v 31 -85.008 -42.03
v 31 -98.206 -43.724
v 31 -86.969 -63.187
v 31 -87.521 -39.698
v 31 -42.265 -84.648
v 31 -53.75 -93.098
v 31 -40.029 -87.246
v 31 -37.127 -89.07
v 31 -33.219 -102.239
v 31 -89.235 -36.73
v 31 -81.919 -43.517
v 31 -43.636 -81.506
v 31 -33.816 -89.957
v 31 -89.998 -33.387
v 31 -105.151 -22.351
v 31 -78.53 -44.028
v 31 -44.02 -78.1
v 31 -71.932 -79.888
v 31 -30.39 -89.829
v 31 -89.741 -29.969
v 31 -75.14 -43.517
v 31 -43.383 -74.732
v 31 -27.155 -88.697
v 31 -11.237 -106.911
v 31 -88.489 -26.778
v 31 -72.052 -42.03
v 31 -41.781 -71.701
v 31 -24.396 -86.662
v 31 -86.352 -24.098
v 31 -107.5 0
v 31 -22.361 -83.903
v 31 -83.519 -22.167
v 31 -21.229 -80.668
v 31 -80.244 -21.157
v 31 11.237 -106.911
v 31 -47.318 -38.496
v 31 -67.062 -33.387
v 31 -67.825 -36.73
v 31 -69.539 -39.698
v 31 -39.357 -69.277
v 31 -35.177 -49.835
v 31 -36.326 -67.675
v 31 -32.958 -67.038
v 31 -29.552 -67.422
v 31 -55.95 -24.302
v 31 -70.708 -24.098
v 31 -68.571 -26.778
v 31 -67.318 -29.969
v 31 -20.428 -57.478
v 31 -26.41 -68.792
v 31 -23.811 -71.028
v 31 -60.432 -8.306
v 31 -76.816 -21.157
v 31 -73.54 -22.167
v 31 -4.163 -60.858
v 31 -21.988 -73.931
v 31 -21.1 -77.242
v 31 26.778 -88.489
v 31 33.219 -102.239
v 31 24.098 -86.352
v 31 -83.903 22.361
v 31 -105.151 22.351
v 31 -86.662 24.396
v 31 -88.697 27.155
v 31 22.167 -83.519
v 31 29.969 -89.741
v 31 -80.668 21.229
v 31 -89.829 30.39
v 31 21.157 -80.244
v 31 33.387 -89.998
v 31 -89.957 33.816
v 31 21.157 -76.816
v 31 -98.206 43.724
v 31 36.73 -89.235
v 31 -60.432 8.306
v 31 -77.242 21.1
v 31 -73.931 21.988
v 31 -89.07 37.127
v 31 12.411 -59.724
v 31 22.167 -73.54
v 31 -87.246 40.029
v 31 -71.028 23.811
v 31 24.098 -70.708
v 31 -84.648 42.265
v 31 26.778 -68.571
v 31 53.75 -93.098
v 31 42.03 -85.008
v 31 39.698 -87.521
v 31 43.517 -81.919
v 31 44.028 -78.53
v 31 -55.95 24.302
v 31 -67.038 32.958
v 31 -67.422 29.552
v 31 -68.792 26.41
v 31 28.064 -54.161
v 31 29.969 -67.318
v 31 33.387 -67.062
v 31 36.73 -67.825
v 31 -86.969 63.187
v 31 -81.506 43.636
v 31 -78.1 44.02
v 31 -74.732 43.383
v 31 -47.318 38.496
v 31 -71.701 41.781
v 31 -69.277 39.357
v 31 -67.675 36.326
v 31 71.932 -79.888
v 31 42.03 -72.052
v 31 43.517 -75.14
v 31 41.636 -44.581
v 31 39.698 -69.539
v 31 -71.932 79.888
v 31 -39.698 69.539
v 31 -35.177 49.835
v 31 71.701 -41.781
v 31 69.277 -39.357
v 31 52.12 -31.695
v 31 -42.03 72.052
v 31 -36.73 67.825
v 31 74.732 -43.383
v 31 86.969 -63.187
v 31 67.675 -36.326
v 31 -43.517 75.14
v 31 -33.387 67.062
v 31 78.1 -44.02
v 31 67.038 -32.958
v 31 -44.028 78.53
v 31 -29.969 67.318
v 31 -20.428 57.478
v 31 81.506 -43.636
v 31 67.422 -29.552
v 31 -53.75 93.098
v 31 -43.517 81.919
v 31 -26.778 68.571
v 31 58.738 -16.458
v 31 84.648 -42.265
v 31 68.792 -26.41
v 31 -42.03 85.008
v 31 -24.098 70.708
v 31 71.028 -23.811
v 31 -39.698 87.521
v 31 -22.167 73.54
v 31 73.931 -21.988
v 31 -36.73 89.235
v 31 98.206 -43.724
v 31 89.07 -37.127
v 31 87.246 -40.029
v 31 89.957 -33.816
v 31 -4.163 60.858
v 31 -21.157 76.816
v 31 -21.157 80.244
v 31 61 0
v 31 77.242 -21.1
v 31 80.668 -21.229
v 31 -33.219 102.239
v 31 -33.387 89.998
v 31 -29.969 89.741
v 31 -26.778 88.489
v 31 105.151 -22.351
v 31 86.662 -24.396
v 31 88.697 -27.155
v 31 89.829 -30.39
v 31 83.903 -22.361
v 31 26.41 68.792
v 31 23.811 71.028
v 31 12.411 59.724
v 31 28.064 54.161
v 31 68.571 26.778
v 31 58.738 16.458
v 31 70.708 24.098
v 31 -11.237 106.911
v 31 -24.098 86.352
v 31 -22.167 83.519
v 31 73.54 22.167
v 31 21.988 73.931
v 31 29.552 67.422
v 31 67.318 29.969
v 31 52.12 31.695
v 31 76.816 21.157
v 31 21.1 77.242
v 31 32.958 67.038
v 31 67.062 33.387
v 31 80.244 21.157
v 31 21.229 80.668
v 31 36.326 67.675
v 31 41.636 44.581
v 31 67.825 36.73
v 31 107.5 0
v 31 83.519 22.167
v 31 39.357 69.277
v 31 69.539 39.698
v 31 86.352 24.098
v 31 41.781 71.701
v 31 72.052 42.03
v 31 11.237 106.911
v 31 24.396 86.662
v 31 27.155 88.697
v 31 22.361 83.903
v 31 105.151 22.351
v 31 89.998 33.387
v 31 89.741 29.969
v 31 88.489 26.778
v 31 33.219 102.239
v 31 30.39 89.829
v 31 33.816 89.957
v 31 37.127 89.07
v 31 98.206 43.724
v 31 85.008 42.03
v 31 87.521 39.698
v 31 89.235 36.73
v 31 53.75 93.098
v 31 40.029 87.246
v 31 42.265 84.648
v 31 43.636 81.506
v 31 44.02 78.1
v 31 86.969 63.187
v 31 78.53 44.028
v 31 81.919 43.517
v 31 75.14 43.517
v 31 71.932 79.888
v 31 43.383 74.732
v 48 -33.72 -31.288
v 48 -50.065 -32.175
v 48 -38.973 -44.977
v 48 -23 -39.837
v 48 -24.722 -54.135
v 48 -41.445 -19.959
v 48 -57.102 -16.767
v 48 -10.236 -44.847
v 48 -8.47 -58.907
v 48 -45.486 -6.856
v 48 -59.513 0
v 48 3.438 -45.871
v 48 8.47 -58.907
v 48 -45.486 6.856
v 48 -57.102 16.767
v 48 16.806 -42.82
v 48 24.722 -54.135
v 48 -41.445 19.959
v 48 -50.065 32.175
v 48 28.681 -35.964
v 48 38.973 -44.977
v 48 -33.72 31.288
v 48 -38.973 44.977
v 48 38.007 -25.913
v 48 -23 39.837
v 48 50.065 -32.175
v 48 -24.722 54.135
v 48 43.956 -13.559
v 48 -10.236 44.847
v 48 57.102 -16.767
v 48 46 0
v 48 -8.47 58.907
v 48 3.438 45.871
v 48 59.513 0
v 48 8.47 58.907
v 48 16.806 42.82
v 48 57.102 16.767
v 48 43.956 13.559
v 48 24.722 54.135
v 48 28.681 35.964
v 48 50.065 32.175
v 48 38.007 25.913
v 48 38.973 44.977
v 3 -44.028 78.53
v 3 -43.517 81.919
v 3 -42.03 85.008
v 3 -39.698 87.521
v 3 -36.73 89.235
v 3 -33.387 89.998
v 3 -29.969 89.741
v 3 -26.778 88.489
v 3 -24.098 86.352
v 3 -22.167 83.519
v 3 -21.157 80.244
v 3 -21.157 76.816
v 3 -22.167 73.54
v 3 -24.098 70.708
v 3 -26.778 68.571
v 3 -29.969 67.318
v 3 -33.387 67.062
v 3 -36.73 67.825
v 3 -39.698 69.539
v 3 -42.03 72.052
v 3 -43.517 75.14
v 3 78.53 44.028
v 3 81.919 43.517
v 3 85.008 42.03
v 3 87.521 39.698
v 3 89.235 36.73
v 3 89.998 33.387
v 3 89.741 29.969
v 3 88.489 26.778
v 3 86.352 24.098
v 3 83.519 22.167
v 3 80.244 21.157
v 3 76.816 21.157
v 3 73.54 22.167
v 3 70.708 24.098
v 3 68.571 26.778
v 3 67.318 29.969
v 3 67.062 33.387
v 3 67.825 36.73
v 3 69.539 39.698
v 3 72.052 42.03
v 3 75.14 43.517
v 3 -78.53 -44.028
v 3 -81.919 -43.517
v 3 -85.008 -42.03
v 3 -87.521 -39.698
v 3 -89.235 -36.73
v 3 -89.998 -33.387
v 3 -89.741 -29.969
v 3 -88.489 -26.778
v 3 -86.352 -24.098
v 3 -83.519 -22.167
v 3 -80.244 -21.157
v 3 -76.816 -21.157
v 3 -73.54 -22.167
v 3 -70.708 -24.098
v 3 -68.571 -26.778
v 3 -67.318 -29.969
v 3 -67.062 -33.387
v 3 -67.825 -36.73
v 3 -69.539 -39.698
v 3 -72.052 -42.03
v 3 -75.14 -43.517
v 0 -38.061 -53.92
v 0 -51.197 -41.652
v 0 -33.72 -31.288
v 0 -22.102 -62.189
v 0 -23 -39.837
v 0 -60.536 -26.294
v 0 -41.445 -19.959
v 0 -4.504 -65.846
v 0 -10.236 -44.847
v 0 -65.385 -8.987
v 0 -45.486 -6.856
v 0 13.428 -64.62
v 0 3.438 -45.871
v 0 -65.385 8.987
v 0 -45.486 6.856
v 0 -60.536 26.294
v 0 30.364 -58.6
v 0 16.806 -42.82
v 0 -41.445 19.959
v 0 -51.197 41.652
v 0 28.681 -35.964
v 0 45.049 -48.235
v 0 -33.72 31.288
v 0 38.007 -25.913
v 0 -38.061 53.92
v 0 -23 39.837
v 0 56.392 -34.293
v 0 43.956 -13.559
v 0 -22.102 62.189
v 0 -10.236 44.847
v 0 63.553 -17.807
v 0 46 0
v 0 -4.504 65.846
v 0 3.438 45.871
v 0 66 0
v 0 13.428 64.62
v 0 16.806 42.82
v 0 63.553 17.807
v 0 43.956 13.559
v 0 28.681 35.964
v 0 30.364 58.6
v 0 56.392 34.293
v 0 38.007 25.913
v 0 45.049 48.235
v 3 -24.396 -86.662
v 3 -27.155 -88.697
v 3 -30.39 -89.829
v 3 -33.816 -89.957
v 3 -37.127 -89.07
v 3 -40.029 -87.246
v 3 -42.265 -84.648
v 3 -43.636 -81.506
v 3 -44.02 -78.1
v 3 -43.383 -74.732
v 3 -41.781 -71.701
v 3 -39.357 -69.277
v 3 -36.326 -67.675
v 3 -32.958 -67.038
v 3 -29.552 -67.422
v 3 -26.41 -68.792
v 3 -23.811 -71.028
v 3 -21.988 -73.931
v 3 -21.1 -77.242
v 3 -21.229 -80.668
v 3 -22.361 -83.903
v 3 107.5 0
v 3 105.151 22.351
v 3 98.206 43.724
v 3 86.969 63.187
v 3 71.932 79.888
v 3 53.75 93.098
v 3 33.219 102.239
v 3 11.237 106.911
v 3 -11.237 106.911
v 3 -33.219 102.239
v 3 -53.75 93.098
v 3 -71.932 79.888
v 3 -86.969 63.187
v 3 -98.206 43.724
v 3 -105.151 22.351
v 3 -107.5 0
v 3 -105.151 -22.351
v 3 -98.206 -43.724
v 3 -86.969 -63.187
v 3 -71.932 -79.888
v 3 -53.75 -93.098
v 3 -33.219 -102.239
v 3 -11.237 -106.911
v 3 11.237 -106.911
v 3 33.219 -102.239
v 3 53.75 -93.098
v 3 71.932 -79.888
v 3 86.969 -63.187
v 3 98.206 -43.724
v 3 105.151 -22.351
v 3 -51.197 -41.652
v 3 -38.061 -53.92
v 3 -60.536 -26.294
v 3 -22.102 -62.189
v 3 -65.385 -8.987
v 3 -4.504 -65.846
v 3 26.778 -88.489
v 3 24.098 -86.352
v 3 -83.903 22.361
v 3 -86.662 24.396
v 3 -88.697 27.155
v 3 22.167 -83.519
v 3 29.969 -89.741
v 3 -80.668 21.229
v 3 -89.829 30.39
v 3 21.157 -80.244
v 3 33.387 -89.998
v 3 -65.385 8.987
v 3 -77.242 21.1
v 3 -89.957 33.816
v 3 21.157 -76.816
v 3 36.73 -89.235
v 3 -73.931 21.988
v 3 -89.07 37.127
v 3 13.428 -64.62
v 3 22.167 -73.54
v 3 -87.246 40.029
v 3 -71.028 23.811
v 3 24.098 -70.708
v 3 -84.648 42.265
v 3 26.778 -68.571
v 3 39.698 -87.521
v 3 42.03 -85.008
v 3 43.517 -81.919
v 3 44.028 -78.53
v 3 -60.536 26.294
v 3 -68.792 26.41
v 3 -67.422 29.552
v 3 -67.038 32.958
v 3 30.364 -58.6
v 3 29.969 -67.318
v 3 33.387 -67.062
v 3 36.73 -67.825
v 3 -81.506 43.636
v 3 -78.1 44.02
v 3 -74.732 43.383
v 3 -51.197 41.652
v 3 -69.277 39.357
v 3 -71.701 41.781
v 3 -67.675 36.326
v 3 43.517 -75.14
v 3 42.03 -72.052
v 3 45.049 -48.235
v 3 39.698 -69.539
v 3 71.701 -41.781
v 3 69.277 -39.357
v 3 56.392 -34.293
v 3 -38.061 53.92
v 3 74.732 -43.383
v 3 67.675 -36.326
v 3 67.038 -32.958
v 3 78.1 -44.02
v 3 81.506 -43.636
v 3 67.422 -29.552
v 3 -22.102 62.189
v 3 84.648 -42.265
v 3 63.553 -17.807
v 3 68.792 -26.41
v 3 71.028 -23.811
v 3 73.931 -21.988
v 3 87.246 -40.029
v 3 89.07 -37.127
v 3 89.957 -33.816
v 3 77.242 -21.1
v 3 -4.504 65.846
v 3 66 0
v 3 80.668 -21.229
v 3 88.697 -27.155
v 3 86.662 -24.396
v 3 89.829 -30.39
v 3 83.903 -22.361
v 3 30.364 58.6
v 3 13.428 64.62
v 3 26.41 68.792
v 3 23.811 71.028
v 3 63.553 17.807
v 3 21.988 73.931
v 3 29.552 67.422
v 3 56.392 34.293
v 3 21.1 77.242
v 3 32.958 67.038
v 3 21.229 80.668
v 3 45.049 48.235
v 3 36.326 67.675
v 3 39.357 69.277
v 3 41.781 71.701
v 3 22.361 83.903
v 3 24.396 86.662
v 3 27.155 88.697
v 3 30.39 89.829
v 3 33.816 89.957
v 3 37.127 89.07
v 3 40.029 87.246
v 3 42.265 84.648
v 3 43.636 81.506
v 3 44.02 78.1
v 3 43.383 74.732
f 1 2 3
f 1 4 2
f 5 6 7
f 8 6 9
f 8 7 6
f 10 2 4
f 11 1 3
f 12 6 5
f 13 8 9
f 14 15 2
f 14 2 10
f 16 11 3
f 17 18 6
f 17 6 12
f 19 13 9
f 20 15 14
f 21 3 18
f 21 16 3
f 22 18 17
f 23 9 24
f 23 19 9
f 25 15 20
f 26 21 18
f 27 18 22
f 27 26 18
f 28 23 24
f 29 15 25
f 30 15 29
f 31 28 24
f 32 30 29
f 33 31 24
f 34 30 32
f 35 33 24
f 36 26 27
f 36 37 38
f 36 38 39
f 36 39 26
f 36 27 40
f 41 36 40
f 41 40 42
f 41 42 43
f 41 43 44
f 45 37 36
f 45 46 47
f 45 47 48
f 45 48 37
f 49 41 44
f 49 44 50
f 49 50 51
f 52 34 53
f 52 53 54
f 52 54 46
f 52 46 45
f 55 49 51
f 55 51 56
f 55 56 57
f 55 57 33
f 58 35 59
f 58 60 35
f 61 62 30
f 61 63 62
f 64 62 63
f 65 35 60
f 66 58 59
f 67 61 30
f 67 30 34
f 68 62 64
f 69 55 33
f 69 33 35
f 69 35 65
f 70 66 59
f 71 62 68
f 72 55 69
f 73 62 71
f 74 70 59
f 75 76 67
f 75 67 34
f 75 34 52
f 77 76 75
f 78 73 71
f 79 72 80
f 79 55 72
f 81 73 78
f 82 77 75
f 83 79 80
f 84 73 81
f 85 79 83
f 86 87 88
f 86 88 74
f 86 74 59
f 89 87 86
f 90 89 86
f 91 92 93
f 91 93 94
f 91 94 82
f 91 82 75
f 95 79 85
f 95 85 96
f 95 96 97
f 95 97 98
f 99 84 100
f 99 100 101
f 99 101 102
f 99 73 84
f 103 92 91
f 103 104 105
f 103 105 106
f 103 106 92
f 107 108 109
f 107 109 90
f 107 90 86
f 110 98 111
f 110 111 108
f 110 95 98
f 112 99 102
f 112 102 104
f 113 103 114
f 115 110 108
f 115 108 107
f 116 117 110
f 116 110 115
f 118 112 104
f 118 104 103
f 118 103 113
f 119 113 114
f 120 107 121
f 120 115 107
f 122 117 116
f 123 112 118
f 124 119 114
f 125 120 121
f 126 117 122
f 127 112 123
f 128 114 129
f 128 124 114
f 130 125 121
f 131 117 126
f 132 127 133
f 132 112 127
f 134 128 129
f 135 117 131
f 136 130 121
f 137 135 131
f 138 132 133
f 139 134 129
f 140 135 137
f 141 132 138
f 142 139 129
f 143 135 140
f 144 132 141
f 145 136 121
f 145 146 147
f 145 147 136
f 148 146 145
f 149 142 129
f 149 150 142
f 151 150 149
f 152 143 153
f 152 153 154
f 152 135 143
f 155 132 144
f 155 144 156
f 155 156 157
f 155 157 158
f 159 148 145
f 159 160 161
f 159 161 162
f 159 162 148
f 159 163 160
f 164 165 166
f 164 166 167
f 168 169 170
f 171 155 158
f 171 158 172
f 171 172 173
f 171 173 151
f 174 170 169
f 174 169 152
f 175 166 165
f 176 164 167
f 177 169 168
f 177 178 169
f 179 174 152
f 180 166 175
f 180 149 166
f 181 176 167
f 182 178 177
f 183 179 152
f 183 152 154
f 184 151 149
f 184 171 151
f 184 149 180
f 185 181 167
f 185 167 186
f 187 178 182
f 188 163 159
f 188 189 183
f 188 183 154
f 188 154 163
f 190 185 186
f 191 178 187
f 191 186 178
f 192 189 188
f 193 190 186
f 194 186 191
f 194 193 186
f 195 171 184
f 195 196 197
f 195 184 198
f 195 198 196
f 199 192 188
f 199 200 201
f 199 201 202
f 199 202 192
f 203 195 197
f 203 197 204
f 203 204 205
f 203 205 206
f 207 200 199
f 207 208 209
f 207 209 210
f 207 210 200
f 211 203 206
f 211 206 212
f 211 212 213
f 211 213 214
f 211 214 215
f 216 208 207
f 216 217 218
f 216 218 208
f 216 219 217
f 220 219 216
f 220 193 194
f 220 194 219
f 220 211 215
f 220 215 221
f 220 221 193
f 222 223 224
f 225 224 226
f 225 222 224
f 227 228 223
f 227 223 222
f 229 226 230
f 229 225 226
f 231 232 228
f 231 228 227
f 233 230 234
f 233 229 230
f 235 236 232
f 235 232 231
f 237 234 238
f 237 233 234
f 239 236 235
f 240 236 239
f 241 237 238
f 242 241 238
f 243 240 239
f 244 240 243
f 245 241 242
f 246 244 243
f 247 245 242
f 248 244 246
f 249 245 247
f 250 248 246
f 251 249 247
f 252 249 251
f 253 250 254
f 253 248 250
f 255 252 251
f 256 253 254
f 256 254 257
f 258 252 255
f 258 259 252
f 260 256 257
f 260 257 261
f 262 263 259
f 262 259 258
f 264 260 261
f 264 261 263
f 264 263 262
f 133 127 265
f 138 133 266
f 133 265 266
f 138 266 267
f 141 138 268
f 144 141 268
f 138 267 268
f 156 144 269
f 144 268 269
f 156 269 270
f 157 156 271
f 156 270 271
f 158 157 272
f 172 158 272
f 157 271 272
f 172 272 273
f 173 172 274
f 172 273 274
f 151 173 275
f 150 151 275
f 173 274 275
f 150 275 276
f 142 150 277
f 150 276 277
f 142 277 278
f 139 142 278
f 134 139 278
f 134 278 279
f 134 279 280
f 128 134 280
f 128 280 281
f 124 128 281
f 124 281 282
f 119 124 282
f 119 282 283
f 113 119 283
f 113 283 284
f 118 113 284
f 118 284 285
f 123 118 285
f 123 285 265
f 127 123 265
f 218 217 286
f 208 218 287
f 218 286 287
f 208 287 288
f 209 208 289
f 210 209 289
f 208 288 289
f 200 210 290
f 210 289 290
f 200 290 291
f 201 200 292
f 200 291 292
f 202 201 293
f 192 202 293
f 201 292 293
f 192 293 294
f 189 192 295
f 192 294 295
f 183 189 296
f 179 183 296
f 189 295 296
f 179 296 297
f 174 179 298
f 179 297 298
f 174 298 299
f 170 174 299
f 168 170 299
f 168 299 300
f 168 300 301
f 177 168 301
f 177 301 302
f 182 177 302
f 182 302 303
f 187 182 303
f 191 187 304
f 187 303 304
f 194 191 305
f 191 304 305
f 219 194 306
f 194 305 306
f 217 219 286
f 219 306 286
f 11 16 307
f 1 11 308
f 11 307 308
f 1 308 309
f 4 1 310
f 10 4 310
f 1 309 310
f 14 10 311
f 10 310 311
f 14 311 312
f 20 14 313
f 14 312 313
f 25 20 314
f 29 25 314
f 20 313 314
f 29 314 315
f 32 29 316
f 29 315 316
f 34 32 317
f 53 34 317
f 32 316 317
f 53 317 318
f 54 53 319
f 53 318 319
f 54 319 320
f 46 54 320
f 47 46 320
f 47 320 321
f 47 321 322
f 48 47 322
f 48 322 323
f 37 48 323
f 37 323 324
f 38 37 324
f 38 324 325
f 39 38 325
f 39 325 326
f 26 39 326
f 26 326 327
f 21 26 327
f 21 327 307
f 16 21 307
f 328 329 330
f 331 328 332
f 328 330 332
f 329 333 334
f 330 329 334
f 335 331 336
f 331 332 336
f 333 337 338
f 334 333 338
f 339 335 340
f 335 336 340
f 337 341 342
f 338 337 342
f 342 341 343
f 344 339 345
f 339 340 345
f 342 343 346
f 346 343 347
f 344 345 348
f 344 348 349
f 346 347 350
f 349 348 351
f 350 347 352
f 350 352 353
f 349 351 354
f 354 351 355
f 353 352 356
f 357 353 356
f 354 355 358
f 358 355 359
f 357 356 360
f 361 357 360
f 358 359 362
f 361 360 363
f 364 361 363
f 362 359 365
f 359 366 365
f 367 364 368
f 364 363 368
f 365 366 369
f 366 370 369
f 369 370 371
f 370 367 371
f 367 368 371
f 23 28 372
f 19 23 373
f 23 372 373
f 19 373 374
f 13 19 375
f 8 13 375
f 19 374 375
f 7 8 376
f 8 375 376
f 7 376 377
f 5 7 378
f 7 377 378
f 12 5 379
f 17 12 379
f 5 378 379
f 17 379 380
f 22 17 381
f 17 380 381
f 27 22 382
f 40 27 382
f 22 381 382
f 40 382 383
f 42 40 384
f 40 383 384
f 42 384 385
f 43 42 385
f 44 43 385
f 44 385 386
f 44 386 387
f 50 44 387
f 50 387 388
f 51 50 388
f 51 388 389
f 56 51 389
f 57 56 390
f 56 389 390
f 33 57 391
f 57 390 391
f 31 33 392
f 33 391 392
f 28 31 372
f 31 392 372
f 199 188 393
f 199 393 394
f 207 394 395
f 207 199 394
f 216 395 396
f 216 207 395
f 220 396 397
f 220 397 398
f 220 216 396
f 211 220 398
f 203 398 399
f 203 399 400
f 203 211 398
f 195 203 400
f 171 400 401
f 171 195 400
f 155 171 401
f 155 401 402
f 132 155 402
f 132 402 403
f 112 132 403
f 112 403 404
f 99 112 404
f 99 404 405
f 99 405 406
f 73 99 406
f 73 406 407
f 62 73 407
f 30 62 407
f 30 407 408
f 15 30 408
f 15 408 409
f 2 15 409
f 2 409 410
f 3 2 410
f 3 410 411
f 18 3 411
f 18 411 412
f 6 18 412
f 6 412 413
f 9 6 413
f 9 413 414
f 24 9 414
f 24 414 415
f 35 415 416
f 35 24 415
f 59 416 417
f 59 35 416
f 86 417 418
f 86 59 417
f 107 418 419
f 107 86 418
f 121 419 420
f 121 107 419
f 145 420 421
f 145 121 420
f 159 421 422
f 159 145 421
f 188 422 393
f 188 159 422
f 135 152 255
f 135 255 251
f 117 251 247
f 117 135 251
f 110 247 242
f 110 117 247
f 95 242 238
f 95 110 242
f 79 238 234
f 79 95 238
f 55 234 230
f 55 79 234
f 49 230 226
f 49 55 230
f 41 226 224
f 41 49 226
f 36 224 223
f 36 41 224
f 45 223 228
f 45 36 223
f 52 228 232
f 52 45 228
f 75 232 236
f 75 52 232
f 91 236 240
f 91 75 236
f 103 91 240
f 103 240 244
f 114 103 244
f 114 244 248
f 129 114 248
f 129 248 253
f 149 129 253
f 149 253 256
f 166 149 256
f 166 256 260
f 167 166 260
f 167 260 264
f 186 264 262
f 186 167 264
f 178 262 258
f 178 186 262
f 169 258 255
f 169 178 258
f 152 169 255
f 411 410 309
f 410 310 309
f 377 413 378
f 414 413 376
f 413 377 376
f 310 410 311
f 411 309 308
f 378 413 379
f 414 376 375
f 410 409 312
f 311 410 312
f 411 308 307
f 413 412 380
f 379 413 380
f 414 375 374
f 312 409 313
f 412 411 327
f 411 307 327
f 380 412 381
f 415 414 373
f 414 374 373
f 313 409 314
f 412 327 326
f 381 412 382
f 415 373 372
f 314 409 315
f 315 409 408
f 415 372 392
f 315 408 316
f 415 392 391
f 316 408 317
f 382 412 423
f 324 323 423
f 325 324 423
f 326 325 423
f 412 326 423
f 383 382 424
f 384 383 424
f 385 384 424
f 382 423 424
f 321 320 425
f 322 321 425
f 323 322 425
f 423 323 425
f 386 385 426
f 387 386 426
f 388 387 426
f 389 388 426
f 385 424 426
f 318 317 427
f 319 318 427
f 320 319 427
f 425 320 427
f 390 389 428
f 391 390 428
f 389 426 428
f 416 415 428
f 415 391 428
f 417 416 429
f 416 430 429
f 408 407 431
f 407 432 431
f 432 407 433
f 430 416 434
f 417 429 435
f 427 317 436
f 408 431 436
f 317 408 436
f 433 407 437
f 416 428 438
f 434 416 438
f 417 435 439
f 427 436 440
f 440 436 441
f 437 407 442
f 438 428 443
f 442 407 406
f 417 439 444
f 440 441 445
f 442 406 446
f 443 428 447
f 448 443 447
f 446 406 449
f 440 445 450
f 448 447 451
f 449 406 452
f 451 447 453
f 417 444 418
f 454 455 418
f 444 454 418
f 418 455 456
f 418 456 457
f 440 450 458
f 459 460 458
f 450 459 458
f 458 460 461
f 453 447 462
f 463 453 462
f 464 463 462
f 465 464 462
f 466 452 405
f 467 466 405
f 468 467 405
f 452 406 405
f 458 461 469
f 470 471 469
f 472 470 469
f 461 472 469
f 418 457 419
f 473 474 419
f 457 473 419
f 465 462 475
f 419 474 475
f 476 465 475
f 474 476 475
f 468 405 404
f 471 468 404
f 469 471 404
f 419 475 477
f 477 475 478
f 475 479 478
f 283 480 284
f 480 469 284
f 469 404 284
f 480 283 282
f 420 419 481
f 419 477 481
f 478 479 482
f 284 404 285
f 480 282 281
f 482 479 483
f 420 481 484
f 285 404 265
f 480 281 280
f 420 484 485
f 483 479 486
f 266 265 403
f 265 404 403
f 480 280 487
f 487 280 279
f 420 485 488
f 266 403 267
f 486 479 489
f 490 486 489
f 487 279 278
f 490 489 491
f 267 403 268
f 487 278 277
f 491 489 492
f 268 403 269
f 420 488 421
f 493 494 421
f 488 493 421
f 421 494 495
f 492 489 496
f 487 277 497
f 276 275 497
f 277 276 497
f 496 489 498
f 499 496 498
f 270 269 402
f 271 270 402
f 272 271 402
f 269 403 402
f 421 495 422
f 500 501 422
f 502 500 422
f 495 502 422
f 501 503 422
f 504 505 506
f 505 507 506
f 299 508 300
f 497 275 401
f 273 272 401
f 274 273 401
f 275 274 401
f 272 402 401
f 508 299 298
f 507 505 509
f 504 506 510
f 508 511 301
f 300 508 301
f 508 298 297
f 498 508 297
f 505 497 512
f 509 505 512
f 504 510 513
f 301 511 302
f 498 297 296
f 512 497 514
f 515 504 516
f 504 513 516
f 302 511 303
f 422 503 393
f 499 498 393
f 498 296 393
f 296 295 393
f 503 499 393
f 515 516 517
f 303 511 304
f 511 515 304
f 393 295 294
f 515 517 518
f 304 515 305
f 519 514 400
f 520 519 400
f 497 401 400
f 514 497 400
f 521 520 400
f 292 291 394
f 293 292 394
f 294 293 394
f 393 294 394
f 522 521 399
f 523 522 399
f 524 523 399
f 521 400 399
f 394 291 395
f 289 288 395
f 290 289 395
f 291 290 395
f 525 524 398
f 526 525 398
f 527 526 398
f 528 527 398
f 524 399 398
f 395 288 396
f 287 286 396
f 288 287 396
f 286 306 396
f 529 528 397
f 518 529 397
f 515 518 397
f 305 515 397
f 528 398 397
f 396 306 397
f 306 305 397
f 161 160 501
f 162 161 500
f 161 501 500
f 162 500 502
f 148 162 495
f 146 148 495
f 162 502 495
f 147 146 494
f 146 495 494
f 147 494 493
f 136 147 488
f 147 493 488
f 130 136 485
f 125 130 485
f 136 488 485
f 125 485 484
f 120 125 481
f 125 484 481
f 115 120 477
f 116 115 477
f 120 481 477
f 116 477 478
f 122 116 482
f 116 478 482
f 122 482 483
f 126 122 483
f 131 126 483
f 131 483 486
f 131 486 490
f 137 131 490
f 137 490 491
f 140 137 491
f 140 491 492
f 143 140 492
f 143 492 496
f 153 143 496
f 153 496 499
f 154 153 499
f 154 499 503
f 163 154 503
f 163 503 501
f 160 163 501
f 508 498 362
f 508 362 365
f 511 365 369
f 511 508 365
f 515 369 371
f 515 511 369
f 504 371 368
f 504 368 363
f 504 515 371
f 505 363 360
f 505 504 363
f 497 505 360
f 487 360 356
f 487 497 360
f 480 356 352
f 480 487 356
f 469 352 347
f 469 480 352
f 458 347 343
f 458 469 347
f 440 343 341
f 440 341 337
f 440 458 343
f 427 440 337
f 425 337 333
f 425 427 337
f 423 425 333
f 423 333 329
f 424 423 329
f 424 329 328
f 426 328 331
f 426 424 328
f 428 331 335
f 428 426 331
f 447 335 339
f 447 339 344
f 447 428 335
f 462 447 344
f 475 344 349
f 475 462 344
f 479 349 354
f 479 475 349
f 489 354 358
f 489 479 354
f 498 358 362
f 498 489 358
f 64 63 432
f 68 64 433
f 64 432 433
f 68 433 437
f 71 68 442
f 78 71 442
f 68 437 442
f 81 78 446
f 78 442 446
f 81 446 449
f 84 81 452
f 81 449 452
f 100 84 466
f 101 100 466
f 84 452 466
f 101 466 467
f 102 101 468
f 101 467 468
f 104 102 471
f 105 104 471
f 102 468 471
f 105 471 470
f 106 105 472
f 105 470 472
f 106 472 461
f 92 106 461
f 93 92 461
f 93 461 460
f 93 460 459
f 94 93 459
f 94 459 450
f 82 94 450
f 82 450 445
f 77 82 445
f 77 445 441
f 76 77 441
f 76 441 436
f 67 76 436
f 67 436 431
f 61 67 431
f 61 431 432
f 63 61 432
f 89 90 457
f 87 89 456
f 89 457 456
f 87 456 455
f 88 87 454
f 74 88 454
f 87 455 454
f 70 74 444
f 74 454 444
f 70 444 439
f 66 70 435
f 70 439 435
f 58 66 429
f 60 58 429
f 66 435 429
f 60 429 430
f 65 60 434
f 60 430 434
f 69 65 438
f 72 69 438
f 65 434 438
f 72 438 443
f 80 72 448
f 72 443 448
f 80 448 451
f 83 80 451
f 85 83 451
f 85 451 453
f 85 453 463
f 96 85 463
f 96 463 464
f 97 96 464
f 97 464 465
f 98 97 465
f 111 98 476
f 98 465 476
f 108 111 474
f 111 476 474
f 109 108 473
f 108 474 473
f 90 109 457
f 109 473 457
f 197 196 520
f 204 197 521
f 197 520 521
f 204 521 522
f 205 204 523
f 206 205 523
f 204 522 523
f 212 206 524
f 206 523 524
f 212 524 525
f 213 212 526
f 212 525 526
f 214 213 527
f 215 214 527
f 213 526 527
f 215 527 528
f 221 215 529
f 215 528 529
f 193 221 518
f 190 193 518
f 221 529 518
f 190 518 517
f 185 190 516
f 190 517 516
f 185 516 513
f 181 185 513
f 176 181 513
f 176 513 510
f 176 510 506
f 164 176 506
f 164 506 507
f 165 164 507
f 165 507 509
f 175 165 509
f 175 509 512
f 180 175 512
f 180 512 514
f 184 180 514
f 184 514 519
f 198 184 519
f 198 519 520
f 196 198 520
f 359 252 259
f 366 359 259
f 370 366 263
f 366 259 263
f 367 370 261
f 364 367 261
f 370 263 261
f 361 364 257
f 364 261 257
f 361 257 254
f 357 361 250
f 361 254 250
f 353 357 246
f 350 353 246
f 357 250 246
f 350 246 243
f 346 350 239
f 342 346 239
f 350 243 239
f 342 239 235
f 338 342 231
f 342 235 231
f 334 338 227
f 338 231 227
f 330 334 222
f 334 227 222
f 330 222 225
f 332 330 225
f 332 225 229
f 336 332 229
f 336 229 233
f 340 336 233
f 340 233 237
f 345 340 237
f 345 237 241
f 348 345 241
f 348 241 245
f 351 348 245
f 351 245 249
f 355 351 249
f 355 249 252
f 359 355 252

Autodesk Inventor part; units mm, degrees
ref_plane "YZ Plane" through (0, 0, 0) normal (1, 0, 0) x (0, 1, 0)
ref_plane "XZ Plane" through (0, 0, 0) normal (0, 1, 0) x (-1, 0, 0)
ref_plane "XY Plane" through (0, 0, 0) normal (0, 0, 1) x (1, 0, 0)
sketch "Sketch1" plane through (0, 0, 0) normal (0, 0, 1) x (1, 0, 0)
  line L0 (0, 0) -> (48, 0) construction
  line L1 (0, 46) -> (0, 66)
  line L2 (0, 66) -> (3, 66)
  line L3 (3, 107.5) -> (31, 107.5)
  line L4 (0, 46) -> (0, 0) construction
  line L5 (3, 107.5) -> (3, 66)
  line L6 (31, 107.5) -> (31, 61)
  line L7 (0, 46) -> (48, 46)
  line L8 (48, 46) -> (48, 0) construction
  line L9 (48, 59.5127) -> (31, 61)
  line L10 (48, 59.5127) -> (48, 46)
  dimension "d0" = 132
  dimension "d1" = 215
  dimension "d2" = 31
  dimension "d3" = 3
  dimension "d8" = 92
  dimension "d9" = 122
  dimension "d10" = 48
  dimension "d12" = 5
revolve "Revolution1" add sketch "Sketch1" angle 360 about axis through (0, 0, 0) along (1, 0, 0)
sketch "Sketch2" plane through (3, 0, 0) normal (-1, 0, 0) x (0, 0, 1)
  circle A0 centre (0, 0) radius 66 projected
  line L0 (0, 0) -> (0, 85) construction
  circle A1 centre (0, 0) radius 107.5 projected
  circle A2 centre (0, 0) radius 85 construction
  line L1 (0, 0) -> (32.5281, 78.5298) construction
  circle A3 centre (32.5281, 78.5298) radius 11.5
  dimension "d13" = 23
  dimension "d14" = 85
  dimension "d15" = 22.5
extrude "Extrusion1" cut sketch "Sketch2" against normal blind 31 contours A3
pattern_circular "Circular Pattern1" count 8 over 360 about axis through (1.5, 0, 0) along (1, 0, 0) of "Extrusion1"
equation "\"d0\" = D1"
equation "\"d1\" = D"
equation "\"d2\" = C1"
equation "\"d3\" = F1"
equation "\"d8\" = ID + 2 * t"
equation "\"d9\" = N3"
equation "\"d10\" = H2"
equation "\"d13\" = L"
equation "\"d14\" = 0.5 * K1"
equation "\"d4\" = C1"
equation "\"C1\" = 31"
equation "\"D\" = 215"
equation "\"L\" = 23"
equation "\"N3\" = 122"
equation "\"D1\" = 132"
equation "\"H2\" = 48"
equation "\"F1\" = 3"
equation "\"t\" = 6"
equation "\"Size_Designation\" = 1.2345"
equation "\"ID\" = 80"
equation "\"K1\" = 170"
properties part number "DIN EN 1092-2 Hubbed Slip-On Flange for Welding Type 12 - PN 63 Ductile Iron DN80" material "Iron, Ductile"
